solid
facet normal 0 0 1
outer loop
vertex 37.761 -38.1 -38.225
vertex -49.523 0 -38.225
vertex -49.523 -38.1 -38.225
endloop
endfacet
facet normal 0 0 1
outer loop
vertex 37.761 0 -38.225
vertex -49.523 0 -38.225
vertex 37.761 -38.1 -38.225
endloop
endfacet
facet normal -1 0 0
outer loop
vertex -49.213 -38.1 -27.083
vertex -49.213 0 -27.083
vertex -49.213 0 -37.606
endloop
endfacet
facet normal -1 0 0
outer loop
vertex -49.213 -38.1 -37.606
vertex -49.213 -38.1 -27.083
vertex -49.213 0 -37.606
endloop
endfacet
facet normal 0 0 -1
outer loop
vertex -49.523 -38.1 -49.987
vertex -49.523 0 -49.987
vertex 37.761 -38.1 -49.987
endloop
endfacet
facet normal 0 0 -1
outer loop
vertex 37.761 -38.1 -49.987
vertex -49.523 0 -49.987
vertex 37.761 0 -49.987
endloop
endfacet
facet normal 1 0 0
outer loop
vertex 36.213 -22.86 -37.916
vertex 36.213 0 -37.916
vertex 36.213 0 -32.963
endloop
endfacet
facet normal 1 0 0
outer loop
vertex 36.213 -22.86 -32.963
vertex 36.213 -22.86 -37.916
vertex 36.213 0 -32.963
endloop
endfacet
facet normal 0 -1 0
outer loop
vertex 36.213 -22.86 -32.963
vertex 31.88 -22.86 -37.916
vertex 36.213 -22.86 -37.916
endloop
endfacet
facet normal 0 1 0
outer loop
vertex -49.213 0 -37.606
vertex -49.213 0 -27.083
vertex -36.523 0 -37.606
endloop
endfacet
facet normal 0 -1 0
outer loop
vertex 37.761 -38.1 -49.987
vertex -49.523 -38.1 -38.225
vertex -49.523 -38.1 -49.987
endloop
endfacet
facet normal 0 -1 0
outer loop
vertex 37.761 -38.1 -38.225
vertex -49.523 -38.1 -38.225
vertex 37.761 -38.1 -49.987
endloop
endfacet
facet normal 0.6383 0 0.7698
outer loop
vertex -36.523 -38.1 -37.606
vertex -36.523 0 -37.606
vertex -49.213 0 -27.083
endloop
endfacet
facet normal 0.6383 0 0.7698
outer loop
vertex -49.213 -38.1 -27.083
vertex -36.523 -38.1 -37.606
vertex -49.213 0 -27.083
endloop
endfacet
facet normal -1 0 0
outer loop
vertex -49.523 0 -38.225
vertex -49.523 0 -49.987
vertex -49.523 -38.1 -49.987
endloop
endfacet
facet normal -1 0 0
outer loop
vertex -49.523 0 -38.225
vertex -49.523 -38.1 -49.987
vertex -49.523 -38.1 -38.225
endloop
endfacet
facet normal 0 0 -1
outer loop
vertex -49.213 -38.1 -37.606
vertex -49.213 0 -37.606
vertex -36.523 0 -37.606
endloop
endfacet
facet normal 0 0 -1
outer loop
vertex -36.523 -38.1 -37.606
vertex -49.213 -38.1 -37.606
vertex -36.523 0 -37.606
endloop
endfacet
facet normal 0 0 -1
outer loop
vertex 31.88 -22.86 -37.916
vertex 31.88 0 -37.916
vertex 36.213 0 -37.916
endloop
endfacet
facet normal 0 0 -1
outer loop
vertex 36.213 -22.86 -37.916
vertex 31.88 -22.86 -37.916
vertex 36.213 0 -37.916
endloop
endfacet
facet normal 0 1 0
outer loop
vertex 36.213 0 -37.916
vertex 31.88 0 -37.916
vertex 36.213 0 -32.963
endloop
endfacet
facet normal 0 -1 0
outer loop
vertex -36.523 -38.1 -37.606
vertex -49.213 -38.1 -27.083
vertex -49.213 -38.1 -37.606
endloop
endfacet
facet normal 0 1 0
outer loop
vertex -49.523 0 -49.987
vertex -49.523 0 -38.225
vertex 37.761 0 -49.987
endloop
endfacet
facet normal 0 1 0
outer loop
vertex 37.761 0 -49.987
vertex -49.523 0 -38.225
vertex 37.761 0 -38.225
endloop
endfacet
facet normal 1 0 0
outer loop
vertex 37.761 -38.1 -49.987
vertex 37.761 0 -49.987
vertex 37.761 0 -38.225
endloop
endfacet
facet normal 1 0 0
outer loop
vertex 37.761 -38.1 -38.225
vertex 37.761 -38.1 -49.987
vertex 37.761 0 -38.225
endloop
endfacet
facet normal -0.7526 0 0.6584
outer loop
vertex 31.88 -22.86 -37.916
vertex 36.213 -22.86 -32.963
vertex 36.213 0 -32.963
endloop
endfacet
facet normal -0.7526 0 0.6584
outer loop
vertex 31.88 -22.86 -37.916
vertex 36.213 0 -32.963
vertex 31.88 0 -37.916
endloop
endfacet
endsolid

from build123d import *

# Parameters (mm, degrees)
F0_W     = 87.283641
F0_H     = 11.761624
F3_DEPTH = 38.1
F4_DEPTH = 38.1
F5_DEPTH = 22.86


with BuildPart() as f3:
    # F0 (on Front) → F3 (new body)
    with BuildSketch(Plane.XZ):
        with Locations((-5.88081, -44.106094)):
            Rectangle(F0_W, F0_H)
    extrude(amount=F3_DEPTH)


with BuildPart() as f4:
    # F1 (on Front) → F4 (new body)
    with BuildSketch(Plane.XZ):
        Polygon((-36.52294, -37.606247), (-49.213115, -27.082689), (-49.213115, -37.606247), align=None)
    extrude(amount=F4_DEPTH)


with BuildPart() as f5:
    # F2 (on Front) → F5 (new body)
    with BuildSketch(Plane.XZ):
        Polygon((36.213428, -32.963499), (31.880192, -37.915763), (36.213428, -37.915763), align=None)
    extrude(amount=F5_DEPTH)


solid = Compound([f3.part, f4.part, f5.part])
